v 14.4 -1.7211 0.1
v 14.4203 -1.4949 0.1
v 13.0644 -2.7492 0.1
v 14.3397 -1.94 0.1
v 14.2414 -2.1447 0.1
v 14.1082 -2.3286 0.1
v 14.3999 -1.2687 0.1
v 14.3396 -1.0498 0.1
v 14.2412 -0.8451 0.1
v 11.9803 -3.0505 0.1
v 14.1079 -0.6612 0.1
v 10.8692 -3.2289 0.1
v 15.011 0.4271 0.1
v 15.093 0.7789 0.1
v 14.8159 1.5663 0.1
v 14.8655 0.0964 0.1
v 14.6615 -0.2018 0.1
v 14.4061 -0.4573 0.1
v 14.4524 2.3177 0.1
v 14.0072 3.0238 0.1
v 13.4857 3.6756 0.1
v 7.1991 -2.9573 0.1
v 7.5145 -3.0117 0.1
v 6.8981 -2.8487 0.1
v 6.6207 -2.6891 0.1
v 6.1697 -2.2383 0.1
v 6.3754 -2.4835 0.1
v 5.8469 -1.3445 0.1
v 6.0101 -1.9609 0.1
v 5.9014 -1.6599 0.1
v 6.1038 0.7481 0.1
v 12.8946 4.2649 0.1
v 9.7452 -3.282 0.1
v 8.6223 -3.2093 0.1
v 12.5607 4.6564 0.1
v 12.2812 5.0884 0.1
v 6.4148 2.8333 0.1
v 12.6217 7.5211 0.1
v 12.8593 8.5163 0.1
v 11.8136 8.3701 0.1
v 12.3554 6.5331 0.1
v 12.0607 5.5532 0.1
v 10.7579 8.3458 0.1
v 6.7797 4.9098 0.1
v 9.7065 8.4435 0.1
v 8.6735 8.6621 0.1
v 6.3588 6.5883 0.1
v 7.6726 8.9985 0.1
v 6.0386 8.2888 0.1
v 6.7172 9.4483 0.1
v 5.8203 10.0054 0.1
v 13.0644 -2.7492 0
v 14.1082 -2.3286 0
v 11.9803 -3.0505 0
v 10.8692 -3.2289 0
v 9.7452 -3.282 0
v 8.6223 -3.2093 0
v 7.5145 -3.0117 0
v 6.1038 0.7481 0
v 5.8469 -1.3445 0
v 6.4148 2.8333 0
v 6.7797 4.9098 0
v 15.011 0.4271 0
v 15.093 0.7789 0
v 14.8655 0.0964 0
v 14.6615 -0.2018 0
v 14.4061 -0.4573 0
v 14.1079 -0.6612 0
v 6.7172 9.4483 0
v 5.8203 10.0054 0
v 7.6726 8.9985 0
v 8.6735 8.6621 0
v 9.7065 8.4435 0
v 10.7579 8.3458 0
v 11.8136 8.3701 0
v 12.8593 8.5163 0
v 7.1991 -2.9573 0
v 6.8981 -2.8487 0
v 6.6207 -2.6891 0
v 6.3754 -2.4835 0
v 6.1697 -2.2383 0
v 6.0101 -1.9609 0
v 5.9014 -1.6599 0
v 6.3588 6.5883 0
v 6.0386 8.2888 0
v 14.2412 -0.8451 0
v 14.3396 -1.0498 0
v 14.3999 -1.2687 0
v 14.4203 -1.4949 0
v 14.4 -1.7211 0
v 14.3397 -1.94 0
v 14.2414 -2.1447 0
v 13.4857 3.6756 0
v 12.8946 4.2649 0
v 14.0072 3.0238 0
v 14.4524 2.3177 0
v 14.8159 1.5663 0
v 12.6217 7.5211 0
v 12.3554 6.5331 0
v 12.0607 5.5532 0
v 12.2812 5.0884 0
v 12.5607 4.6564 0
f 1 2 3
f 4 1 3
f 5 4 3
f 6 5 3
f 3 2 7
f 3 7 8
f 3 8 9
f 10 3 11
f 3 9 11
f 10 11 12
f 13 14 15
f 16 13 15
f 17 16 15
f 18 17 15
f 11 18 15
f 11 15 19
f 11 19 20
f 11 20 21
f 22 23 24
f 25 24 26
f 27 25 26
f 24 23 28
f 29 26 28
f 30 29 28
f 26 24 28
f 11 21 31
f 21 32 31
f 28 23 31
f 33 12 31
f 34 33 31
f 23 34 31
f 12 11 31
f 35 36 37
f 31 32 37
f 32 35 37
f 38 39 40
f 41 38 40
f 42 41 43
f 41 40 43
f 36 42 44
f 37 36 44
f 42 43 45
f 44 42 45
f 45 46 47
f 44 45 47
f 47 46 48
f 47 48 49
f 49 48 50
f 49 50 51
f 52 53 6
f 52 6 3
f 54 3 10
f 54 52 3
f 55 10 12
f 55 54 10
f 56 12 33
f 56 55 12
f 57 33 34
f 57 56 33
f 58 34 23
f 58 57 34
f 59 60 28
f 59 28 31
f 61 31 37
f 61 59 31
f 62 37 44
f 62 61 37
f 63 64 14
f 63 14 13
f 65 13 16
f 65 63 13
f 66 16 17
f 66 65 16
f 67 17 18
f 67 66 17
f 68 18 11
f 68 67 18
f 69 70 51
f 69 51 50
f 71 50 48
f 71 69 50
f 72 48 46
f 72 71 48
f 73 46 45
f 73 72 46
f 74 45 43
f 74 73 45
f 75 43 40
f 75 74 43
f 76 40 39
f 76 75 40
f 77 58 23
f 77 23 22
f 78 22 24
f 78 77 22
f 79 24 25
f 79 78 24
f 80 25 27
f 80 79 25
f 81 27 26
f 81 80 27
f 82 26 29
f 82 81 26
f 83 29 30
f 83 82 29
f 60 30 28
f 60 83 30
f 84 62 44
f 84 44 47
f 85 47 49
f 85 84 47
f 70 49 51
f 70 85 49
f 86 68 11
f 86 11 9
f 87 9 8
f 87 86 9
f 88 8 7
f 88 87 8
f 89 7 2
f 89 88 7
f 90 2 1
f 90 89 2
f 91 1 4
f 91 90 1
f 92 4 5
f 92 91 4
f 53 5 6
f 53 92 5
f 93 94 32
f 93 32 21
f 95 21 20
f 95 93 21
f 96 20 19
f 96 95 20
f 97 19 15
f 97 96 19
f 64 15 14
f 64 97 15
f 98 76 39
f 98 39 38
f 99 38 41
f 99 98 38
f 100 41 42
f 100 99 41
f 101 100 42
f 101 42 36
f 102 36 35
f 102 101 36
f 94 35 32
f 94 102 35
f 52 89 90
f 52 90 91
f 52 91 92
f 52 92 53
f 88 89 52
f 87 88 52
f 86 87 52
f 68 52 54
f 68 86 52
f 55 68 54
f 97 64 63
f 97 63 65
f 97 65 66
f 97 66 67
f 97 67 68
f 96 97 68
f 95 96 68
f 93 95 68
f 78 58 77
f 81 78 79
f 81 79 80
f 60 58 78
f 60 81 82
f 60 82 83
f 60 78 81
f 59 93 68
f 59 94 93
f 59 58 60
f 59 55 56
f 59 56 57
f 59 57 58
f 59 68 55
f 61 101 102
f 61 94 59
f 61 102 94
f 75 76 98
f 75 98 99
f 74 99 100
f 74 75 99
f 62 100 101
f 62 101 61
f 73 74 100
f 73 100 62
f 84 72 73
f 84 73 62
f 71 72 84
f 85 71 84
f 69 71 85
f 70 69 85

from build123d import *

# Parameters (mm, degrees)
SALIENTE_EXTRUIR1_DEPTH = 0.1


with BuildPart() as part:
    # Model → Saliente-Extruir1 (new body)
    with BuildSketch(Plane.XY):
        with BuildLine():
            ThreePointArc((5.820261238, 10.005409211), (9.186847838, 8.537831037), (12.859343802, 8.516280459))
            ThreePointArc((12.859343802, 8.516280459), (12.492089591, 7.026118334), (12.060688518, 5.553246333))
            ThreePointArc((12.060688518, 5.553246333), (12.413842974, 4.867805835), (12.894565351, 4.264935416))
            ThreePointArc((12.894565351, 4.264935416), (14.239685442, 2.677003657), (15.09298084, 0.778909273))
            ThreePointArc((15.09298084, 0.778909273), (14.77043638, -0.057438485), (14.107917756, -0.661244393))
            ThreePointArc((14.107917756, -0.661244393), (14.420283265, -1.49489014), (14.108158471, -2.328626043))
            ThreePointArc((14.108158471, -2.328626043), (10.869217247, -3.228854701), (7.514520421, -3.011688639))
            ThreePointArc((7.514520421, -3.011688639), (6.375365831, -2.483549755), (5.846898055, -1.344547705))
            ThreePointArc((5.846898055, -1.344547705), (6.252533801, 1.79168345), (6.779728877, 4.909784085))
            ThreePointArc((6.779728877, 4.909784085), (6.186082282, 7.436147735), (5.820261238, 10.005409211))
        make_face()
    extrude(amount=SALIENTE_EXTRUIR1_DEPTH)


solid = part.part
